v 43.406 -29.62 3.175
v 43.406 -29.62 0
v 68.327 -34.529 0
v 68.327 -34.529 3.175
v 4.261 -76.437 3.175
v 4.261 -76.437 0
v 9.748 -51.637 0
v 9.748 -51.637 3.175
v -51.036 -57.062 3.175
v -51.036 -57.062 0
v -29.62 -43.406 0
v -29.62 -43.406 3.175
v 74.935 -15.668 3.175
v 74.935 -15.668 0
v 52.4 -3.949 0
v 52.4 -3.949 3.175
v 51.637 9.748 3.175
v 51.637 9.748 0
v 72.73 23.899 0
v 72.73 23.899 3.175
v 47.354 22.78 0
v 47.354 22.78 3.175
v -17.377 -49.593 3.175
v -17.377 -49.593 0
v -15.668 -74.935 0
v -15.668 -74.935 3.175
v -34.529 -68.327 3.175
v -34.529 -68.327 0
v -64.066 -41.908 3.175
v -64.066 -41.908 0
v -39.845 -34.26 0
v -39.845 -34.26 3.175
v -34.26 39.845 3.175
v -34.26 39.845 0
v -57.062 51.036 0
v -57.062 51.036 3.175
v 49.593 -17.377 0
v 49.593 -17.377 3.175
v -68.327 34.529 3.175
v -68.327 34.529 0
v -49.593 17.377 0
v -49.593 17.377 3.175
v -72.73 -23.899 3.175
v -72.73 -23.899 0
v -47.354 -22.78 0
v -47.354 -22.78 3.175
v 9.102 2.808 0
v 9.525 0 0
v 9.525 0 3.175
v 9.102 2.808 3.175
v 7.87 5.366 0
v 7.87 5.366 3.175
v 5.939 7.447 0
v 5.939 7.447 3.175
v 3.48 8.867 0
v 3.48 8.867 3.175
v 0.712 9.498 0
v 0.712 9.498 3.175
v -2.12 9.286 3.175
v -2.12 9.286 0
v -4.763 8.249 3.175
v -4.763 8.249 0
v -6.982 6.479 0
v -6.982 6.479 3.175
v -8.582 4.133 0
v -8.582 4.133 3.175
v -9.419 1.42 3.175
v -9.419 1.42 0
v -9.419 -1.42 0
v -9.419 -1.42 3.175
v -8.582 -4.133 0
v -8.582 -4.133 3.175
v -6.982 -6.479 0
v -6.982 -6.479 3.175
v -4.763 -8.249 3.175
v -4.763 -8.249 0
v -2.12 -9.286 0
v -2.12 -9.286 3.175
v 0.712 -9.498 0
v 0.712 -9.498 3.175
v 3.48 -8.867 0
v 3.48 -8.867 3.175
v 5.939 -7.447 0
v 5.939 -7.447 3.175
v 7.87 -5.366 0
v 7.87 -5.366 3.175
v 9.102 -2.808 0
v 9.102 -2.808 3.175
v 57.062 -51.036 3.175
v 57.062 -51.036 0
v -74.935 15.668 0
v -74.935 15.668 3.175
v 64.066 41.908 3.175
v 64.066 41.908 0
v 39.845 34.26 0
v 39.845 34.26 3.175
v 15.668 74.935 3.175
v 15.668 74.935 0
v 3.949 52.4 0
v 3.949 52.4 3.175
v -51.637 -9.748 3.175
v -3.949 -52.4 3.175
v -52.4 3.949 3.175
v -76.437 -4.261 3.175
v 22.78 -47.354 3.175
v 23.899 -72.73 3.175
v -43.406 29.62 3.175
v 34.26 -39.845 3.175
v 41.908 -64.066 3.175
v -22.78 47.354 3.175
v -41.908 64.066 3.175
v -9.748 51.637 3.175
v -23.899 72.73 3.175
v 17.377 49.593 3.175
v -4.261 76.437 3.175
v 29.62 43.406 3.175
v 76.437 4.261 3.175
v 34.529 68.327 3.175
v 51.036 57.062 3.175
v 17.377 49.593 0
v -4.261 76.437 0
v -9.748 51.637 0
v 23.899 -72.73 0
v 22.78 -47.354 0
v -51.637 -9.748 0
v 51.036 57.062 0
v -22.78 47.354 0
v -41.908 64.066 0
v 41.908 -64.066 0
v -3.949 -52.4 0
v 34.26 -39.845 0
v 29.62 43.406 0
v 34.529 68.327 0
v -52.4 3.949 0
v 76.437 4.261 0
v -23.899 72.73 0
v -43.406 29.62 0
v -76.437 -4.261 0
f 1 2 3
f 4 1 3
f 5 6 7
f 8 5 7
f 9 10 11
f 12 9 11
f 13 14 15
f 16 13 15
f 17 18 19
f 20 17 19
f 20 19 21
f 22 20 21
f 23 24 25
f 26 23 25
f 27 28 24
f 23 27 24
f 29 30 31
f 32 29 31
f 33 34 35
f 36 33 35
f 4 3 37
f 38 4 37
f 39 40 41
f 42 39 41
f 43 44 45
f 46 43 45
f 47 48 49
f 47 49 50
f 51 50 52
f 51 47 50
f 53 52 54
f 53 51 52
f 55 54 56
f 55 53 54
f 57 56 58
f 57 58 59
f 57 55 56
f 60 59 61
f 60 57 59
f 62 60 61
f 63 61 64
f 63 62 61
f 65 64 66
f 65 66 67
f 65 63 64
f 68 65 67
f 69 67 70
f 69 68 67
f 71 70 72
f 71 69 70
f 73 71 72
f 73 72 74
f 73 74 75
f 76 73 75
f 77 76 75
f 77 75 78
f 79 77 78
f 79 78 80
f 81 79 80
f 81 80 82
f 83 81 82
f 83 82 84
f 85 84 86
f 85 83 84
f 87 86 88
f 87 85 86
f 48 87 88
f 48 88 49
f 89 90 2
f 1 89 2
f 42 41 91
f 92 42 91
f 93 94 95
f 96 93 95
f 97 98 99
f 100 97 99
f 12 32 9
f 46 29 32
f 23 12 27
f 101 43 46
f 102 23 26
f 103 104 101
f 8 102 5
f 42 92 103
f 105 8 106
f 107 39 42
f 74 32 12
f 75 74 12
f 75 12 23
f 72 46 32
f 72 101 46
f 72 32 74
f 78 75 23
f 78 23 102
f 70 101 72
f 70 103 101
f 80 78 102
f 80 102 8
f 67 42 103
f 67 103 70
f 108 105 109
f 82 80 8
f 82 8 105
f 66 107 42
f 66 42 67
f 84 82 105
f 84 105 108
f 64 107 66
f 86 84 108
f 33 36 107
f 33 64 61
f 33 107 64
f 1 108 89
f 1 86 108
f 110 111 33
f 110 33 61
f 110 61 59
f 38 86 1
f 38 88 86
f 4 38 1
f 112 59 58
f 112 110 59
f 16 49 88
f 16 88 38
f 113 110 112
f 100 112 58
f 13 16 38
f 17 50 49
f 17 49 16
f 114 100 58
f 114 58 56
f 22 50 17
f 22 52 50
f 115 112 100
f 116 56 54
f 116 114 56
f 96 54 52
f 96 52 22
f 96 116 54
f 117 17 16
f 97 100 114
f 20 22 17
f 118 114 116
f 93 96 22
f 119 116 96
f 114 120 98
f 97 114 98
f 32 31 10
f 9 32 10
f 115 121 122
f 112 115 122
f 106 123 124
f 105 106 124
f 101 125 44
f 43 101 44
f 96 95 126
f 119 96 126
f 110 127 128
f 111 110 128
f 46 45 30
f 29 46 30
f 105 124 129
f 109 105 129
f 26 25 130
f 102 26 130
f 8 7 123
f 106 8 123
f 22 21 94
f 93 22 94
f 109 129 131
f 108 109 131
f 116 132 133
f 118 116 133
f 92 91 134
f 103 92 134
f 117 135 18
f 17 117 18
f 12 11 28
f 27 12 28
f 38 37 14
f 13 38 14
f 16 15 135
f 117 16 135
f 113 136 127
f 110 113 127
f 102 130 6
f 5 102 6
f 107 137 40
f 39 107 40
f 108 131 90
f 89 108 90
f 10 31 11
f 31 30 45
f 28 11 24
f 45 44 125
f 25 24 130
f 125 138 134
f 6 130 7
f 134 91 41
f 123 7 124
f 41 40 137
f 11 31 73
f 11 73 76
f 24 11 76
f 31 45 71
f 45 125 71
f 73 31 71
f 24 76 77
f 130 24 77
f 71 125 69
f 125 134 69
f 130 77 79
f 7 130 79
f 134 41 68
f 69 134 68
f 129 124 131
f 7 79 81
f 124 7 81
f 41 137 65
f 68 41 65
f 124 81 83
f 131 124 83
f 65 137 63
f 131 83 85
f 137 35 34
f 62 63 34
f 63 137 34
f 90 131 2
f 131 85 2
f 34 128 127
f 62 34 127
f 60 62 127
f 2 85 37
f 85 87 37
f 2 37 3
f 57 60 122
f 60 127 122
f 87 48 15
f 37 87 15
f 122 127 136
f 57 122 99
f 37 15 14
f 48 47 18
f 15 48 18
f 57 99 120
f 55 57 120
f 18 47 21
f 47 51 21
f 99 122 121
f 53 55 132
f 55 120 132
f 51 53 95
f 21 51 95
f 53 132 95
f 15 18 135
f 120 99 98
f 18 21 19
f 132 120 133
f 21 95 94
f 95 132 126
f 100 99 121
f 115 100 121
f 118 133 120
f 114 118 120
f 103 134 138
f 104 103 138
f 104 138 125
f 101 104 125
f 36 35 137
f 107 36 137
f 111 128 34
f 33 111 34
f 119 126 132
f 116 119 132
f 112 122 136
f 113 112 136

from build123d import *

# Parameters (mm, degrees)
F0_R     = 9.525
F1_DEPTH = 3.175


with BuildPart() as f1:
    # F0 (on Top) → F1 (new body)
    with BuildSketch(Plane.XY):
        Polygon((34.528738, 68.326658), (17.376506, 49.592707), (15.66796, 74.935178), (3.948879, 52.400247), (-4.260564, 76.436991), (-9.747858, 51.636797), (-23.898738, 72.729748), (-22.780294, 47.354384), (-41.908252, 64.066093), (-34.260291, 39.844849), (-57.061788, 51.03644), (-43.405506, 29.619953), (-68.326658, 34.528738), (-49.592707, 17.376506), (-74.935178, 15.66796), (-52.400247, 3.948879), (-76.436991, -4.260564), (-51.636797, -9.747858), (-72.729748, -23.898738), (-47.354384, -22.780294), (-64.066093, -41.908252), (-39.844849, -34.260291), (-51.03644, -57.061788), (-29.619953, -43.405506), (-34.528738, -68.326658), (-17.376506, -49.592707), (-15.66796, -74.935178), (-3.948879, -52.400247), (4.260564, -76.436991), (9.747858, -51.636797), (23.898738, -72.729748), (22.780294, -47.354384), (41.908252, -64.066093), (34.260291, -39.844849), (57.061788, -51.03644), (43.405506, -29.619953), (68.326658, -34.528738), (49.592707, -17.376506), (74.935178, -15.66796), (52.400247, -3.948879), (76.436991, 4.260564), (51.636797, 9.747858), (72.729748, 23.898738), (47.354384, 22.780294), (64.066093, 41.908252), (39.844849, 34.260291), (51.03644, 57.061788), (29.619953, 43.405506), align=None)
        Circle(F0_R, mode=Mode.SUBTRACT)
    extrude(amount=F1_DEPTH)


solid = f1.part
